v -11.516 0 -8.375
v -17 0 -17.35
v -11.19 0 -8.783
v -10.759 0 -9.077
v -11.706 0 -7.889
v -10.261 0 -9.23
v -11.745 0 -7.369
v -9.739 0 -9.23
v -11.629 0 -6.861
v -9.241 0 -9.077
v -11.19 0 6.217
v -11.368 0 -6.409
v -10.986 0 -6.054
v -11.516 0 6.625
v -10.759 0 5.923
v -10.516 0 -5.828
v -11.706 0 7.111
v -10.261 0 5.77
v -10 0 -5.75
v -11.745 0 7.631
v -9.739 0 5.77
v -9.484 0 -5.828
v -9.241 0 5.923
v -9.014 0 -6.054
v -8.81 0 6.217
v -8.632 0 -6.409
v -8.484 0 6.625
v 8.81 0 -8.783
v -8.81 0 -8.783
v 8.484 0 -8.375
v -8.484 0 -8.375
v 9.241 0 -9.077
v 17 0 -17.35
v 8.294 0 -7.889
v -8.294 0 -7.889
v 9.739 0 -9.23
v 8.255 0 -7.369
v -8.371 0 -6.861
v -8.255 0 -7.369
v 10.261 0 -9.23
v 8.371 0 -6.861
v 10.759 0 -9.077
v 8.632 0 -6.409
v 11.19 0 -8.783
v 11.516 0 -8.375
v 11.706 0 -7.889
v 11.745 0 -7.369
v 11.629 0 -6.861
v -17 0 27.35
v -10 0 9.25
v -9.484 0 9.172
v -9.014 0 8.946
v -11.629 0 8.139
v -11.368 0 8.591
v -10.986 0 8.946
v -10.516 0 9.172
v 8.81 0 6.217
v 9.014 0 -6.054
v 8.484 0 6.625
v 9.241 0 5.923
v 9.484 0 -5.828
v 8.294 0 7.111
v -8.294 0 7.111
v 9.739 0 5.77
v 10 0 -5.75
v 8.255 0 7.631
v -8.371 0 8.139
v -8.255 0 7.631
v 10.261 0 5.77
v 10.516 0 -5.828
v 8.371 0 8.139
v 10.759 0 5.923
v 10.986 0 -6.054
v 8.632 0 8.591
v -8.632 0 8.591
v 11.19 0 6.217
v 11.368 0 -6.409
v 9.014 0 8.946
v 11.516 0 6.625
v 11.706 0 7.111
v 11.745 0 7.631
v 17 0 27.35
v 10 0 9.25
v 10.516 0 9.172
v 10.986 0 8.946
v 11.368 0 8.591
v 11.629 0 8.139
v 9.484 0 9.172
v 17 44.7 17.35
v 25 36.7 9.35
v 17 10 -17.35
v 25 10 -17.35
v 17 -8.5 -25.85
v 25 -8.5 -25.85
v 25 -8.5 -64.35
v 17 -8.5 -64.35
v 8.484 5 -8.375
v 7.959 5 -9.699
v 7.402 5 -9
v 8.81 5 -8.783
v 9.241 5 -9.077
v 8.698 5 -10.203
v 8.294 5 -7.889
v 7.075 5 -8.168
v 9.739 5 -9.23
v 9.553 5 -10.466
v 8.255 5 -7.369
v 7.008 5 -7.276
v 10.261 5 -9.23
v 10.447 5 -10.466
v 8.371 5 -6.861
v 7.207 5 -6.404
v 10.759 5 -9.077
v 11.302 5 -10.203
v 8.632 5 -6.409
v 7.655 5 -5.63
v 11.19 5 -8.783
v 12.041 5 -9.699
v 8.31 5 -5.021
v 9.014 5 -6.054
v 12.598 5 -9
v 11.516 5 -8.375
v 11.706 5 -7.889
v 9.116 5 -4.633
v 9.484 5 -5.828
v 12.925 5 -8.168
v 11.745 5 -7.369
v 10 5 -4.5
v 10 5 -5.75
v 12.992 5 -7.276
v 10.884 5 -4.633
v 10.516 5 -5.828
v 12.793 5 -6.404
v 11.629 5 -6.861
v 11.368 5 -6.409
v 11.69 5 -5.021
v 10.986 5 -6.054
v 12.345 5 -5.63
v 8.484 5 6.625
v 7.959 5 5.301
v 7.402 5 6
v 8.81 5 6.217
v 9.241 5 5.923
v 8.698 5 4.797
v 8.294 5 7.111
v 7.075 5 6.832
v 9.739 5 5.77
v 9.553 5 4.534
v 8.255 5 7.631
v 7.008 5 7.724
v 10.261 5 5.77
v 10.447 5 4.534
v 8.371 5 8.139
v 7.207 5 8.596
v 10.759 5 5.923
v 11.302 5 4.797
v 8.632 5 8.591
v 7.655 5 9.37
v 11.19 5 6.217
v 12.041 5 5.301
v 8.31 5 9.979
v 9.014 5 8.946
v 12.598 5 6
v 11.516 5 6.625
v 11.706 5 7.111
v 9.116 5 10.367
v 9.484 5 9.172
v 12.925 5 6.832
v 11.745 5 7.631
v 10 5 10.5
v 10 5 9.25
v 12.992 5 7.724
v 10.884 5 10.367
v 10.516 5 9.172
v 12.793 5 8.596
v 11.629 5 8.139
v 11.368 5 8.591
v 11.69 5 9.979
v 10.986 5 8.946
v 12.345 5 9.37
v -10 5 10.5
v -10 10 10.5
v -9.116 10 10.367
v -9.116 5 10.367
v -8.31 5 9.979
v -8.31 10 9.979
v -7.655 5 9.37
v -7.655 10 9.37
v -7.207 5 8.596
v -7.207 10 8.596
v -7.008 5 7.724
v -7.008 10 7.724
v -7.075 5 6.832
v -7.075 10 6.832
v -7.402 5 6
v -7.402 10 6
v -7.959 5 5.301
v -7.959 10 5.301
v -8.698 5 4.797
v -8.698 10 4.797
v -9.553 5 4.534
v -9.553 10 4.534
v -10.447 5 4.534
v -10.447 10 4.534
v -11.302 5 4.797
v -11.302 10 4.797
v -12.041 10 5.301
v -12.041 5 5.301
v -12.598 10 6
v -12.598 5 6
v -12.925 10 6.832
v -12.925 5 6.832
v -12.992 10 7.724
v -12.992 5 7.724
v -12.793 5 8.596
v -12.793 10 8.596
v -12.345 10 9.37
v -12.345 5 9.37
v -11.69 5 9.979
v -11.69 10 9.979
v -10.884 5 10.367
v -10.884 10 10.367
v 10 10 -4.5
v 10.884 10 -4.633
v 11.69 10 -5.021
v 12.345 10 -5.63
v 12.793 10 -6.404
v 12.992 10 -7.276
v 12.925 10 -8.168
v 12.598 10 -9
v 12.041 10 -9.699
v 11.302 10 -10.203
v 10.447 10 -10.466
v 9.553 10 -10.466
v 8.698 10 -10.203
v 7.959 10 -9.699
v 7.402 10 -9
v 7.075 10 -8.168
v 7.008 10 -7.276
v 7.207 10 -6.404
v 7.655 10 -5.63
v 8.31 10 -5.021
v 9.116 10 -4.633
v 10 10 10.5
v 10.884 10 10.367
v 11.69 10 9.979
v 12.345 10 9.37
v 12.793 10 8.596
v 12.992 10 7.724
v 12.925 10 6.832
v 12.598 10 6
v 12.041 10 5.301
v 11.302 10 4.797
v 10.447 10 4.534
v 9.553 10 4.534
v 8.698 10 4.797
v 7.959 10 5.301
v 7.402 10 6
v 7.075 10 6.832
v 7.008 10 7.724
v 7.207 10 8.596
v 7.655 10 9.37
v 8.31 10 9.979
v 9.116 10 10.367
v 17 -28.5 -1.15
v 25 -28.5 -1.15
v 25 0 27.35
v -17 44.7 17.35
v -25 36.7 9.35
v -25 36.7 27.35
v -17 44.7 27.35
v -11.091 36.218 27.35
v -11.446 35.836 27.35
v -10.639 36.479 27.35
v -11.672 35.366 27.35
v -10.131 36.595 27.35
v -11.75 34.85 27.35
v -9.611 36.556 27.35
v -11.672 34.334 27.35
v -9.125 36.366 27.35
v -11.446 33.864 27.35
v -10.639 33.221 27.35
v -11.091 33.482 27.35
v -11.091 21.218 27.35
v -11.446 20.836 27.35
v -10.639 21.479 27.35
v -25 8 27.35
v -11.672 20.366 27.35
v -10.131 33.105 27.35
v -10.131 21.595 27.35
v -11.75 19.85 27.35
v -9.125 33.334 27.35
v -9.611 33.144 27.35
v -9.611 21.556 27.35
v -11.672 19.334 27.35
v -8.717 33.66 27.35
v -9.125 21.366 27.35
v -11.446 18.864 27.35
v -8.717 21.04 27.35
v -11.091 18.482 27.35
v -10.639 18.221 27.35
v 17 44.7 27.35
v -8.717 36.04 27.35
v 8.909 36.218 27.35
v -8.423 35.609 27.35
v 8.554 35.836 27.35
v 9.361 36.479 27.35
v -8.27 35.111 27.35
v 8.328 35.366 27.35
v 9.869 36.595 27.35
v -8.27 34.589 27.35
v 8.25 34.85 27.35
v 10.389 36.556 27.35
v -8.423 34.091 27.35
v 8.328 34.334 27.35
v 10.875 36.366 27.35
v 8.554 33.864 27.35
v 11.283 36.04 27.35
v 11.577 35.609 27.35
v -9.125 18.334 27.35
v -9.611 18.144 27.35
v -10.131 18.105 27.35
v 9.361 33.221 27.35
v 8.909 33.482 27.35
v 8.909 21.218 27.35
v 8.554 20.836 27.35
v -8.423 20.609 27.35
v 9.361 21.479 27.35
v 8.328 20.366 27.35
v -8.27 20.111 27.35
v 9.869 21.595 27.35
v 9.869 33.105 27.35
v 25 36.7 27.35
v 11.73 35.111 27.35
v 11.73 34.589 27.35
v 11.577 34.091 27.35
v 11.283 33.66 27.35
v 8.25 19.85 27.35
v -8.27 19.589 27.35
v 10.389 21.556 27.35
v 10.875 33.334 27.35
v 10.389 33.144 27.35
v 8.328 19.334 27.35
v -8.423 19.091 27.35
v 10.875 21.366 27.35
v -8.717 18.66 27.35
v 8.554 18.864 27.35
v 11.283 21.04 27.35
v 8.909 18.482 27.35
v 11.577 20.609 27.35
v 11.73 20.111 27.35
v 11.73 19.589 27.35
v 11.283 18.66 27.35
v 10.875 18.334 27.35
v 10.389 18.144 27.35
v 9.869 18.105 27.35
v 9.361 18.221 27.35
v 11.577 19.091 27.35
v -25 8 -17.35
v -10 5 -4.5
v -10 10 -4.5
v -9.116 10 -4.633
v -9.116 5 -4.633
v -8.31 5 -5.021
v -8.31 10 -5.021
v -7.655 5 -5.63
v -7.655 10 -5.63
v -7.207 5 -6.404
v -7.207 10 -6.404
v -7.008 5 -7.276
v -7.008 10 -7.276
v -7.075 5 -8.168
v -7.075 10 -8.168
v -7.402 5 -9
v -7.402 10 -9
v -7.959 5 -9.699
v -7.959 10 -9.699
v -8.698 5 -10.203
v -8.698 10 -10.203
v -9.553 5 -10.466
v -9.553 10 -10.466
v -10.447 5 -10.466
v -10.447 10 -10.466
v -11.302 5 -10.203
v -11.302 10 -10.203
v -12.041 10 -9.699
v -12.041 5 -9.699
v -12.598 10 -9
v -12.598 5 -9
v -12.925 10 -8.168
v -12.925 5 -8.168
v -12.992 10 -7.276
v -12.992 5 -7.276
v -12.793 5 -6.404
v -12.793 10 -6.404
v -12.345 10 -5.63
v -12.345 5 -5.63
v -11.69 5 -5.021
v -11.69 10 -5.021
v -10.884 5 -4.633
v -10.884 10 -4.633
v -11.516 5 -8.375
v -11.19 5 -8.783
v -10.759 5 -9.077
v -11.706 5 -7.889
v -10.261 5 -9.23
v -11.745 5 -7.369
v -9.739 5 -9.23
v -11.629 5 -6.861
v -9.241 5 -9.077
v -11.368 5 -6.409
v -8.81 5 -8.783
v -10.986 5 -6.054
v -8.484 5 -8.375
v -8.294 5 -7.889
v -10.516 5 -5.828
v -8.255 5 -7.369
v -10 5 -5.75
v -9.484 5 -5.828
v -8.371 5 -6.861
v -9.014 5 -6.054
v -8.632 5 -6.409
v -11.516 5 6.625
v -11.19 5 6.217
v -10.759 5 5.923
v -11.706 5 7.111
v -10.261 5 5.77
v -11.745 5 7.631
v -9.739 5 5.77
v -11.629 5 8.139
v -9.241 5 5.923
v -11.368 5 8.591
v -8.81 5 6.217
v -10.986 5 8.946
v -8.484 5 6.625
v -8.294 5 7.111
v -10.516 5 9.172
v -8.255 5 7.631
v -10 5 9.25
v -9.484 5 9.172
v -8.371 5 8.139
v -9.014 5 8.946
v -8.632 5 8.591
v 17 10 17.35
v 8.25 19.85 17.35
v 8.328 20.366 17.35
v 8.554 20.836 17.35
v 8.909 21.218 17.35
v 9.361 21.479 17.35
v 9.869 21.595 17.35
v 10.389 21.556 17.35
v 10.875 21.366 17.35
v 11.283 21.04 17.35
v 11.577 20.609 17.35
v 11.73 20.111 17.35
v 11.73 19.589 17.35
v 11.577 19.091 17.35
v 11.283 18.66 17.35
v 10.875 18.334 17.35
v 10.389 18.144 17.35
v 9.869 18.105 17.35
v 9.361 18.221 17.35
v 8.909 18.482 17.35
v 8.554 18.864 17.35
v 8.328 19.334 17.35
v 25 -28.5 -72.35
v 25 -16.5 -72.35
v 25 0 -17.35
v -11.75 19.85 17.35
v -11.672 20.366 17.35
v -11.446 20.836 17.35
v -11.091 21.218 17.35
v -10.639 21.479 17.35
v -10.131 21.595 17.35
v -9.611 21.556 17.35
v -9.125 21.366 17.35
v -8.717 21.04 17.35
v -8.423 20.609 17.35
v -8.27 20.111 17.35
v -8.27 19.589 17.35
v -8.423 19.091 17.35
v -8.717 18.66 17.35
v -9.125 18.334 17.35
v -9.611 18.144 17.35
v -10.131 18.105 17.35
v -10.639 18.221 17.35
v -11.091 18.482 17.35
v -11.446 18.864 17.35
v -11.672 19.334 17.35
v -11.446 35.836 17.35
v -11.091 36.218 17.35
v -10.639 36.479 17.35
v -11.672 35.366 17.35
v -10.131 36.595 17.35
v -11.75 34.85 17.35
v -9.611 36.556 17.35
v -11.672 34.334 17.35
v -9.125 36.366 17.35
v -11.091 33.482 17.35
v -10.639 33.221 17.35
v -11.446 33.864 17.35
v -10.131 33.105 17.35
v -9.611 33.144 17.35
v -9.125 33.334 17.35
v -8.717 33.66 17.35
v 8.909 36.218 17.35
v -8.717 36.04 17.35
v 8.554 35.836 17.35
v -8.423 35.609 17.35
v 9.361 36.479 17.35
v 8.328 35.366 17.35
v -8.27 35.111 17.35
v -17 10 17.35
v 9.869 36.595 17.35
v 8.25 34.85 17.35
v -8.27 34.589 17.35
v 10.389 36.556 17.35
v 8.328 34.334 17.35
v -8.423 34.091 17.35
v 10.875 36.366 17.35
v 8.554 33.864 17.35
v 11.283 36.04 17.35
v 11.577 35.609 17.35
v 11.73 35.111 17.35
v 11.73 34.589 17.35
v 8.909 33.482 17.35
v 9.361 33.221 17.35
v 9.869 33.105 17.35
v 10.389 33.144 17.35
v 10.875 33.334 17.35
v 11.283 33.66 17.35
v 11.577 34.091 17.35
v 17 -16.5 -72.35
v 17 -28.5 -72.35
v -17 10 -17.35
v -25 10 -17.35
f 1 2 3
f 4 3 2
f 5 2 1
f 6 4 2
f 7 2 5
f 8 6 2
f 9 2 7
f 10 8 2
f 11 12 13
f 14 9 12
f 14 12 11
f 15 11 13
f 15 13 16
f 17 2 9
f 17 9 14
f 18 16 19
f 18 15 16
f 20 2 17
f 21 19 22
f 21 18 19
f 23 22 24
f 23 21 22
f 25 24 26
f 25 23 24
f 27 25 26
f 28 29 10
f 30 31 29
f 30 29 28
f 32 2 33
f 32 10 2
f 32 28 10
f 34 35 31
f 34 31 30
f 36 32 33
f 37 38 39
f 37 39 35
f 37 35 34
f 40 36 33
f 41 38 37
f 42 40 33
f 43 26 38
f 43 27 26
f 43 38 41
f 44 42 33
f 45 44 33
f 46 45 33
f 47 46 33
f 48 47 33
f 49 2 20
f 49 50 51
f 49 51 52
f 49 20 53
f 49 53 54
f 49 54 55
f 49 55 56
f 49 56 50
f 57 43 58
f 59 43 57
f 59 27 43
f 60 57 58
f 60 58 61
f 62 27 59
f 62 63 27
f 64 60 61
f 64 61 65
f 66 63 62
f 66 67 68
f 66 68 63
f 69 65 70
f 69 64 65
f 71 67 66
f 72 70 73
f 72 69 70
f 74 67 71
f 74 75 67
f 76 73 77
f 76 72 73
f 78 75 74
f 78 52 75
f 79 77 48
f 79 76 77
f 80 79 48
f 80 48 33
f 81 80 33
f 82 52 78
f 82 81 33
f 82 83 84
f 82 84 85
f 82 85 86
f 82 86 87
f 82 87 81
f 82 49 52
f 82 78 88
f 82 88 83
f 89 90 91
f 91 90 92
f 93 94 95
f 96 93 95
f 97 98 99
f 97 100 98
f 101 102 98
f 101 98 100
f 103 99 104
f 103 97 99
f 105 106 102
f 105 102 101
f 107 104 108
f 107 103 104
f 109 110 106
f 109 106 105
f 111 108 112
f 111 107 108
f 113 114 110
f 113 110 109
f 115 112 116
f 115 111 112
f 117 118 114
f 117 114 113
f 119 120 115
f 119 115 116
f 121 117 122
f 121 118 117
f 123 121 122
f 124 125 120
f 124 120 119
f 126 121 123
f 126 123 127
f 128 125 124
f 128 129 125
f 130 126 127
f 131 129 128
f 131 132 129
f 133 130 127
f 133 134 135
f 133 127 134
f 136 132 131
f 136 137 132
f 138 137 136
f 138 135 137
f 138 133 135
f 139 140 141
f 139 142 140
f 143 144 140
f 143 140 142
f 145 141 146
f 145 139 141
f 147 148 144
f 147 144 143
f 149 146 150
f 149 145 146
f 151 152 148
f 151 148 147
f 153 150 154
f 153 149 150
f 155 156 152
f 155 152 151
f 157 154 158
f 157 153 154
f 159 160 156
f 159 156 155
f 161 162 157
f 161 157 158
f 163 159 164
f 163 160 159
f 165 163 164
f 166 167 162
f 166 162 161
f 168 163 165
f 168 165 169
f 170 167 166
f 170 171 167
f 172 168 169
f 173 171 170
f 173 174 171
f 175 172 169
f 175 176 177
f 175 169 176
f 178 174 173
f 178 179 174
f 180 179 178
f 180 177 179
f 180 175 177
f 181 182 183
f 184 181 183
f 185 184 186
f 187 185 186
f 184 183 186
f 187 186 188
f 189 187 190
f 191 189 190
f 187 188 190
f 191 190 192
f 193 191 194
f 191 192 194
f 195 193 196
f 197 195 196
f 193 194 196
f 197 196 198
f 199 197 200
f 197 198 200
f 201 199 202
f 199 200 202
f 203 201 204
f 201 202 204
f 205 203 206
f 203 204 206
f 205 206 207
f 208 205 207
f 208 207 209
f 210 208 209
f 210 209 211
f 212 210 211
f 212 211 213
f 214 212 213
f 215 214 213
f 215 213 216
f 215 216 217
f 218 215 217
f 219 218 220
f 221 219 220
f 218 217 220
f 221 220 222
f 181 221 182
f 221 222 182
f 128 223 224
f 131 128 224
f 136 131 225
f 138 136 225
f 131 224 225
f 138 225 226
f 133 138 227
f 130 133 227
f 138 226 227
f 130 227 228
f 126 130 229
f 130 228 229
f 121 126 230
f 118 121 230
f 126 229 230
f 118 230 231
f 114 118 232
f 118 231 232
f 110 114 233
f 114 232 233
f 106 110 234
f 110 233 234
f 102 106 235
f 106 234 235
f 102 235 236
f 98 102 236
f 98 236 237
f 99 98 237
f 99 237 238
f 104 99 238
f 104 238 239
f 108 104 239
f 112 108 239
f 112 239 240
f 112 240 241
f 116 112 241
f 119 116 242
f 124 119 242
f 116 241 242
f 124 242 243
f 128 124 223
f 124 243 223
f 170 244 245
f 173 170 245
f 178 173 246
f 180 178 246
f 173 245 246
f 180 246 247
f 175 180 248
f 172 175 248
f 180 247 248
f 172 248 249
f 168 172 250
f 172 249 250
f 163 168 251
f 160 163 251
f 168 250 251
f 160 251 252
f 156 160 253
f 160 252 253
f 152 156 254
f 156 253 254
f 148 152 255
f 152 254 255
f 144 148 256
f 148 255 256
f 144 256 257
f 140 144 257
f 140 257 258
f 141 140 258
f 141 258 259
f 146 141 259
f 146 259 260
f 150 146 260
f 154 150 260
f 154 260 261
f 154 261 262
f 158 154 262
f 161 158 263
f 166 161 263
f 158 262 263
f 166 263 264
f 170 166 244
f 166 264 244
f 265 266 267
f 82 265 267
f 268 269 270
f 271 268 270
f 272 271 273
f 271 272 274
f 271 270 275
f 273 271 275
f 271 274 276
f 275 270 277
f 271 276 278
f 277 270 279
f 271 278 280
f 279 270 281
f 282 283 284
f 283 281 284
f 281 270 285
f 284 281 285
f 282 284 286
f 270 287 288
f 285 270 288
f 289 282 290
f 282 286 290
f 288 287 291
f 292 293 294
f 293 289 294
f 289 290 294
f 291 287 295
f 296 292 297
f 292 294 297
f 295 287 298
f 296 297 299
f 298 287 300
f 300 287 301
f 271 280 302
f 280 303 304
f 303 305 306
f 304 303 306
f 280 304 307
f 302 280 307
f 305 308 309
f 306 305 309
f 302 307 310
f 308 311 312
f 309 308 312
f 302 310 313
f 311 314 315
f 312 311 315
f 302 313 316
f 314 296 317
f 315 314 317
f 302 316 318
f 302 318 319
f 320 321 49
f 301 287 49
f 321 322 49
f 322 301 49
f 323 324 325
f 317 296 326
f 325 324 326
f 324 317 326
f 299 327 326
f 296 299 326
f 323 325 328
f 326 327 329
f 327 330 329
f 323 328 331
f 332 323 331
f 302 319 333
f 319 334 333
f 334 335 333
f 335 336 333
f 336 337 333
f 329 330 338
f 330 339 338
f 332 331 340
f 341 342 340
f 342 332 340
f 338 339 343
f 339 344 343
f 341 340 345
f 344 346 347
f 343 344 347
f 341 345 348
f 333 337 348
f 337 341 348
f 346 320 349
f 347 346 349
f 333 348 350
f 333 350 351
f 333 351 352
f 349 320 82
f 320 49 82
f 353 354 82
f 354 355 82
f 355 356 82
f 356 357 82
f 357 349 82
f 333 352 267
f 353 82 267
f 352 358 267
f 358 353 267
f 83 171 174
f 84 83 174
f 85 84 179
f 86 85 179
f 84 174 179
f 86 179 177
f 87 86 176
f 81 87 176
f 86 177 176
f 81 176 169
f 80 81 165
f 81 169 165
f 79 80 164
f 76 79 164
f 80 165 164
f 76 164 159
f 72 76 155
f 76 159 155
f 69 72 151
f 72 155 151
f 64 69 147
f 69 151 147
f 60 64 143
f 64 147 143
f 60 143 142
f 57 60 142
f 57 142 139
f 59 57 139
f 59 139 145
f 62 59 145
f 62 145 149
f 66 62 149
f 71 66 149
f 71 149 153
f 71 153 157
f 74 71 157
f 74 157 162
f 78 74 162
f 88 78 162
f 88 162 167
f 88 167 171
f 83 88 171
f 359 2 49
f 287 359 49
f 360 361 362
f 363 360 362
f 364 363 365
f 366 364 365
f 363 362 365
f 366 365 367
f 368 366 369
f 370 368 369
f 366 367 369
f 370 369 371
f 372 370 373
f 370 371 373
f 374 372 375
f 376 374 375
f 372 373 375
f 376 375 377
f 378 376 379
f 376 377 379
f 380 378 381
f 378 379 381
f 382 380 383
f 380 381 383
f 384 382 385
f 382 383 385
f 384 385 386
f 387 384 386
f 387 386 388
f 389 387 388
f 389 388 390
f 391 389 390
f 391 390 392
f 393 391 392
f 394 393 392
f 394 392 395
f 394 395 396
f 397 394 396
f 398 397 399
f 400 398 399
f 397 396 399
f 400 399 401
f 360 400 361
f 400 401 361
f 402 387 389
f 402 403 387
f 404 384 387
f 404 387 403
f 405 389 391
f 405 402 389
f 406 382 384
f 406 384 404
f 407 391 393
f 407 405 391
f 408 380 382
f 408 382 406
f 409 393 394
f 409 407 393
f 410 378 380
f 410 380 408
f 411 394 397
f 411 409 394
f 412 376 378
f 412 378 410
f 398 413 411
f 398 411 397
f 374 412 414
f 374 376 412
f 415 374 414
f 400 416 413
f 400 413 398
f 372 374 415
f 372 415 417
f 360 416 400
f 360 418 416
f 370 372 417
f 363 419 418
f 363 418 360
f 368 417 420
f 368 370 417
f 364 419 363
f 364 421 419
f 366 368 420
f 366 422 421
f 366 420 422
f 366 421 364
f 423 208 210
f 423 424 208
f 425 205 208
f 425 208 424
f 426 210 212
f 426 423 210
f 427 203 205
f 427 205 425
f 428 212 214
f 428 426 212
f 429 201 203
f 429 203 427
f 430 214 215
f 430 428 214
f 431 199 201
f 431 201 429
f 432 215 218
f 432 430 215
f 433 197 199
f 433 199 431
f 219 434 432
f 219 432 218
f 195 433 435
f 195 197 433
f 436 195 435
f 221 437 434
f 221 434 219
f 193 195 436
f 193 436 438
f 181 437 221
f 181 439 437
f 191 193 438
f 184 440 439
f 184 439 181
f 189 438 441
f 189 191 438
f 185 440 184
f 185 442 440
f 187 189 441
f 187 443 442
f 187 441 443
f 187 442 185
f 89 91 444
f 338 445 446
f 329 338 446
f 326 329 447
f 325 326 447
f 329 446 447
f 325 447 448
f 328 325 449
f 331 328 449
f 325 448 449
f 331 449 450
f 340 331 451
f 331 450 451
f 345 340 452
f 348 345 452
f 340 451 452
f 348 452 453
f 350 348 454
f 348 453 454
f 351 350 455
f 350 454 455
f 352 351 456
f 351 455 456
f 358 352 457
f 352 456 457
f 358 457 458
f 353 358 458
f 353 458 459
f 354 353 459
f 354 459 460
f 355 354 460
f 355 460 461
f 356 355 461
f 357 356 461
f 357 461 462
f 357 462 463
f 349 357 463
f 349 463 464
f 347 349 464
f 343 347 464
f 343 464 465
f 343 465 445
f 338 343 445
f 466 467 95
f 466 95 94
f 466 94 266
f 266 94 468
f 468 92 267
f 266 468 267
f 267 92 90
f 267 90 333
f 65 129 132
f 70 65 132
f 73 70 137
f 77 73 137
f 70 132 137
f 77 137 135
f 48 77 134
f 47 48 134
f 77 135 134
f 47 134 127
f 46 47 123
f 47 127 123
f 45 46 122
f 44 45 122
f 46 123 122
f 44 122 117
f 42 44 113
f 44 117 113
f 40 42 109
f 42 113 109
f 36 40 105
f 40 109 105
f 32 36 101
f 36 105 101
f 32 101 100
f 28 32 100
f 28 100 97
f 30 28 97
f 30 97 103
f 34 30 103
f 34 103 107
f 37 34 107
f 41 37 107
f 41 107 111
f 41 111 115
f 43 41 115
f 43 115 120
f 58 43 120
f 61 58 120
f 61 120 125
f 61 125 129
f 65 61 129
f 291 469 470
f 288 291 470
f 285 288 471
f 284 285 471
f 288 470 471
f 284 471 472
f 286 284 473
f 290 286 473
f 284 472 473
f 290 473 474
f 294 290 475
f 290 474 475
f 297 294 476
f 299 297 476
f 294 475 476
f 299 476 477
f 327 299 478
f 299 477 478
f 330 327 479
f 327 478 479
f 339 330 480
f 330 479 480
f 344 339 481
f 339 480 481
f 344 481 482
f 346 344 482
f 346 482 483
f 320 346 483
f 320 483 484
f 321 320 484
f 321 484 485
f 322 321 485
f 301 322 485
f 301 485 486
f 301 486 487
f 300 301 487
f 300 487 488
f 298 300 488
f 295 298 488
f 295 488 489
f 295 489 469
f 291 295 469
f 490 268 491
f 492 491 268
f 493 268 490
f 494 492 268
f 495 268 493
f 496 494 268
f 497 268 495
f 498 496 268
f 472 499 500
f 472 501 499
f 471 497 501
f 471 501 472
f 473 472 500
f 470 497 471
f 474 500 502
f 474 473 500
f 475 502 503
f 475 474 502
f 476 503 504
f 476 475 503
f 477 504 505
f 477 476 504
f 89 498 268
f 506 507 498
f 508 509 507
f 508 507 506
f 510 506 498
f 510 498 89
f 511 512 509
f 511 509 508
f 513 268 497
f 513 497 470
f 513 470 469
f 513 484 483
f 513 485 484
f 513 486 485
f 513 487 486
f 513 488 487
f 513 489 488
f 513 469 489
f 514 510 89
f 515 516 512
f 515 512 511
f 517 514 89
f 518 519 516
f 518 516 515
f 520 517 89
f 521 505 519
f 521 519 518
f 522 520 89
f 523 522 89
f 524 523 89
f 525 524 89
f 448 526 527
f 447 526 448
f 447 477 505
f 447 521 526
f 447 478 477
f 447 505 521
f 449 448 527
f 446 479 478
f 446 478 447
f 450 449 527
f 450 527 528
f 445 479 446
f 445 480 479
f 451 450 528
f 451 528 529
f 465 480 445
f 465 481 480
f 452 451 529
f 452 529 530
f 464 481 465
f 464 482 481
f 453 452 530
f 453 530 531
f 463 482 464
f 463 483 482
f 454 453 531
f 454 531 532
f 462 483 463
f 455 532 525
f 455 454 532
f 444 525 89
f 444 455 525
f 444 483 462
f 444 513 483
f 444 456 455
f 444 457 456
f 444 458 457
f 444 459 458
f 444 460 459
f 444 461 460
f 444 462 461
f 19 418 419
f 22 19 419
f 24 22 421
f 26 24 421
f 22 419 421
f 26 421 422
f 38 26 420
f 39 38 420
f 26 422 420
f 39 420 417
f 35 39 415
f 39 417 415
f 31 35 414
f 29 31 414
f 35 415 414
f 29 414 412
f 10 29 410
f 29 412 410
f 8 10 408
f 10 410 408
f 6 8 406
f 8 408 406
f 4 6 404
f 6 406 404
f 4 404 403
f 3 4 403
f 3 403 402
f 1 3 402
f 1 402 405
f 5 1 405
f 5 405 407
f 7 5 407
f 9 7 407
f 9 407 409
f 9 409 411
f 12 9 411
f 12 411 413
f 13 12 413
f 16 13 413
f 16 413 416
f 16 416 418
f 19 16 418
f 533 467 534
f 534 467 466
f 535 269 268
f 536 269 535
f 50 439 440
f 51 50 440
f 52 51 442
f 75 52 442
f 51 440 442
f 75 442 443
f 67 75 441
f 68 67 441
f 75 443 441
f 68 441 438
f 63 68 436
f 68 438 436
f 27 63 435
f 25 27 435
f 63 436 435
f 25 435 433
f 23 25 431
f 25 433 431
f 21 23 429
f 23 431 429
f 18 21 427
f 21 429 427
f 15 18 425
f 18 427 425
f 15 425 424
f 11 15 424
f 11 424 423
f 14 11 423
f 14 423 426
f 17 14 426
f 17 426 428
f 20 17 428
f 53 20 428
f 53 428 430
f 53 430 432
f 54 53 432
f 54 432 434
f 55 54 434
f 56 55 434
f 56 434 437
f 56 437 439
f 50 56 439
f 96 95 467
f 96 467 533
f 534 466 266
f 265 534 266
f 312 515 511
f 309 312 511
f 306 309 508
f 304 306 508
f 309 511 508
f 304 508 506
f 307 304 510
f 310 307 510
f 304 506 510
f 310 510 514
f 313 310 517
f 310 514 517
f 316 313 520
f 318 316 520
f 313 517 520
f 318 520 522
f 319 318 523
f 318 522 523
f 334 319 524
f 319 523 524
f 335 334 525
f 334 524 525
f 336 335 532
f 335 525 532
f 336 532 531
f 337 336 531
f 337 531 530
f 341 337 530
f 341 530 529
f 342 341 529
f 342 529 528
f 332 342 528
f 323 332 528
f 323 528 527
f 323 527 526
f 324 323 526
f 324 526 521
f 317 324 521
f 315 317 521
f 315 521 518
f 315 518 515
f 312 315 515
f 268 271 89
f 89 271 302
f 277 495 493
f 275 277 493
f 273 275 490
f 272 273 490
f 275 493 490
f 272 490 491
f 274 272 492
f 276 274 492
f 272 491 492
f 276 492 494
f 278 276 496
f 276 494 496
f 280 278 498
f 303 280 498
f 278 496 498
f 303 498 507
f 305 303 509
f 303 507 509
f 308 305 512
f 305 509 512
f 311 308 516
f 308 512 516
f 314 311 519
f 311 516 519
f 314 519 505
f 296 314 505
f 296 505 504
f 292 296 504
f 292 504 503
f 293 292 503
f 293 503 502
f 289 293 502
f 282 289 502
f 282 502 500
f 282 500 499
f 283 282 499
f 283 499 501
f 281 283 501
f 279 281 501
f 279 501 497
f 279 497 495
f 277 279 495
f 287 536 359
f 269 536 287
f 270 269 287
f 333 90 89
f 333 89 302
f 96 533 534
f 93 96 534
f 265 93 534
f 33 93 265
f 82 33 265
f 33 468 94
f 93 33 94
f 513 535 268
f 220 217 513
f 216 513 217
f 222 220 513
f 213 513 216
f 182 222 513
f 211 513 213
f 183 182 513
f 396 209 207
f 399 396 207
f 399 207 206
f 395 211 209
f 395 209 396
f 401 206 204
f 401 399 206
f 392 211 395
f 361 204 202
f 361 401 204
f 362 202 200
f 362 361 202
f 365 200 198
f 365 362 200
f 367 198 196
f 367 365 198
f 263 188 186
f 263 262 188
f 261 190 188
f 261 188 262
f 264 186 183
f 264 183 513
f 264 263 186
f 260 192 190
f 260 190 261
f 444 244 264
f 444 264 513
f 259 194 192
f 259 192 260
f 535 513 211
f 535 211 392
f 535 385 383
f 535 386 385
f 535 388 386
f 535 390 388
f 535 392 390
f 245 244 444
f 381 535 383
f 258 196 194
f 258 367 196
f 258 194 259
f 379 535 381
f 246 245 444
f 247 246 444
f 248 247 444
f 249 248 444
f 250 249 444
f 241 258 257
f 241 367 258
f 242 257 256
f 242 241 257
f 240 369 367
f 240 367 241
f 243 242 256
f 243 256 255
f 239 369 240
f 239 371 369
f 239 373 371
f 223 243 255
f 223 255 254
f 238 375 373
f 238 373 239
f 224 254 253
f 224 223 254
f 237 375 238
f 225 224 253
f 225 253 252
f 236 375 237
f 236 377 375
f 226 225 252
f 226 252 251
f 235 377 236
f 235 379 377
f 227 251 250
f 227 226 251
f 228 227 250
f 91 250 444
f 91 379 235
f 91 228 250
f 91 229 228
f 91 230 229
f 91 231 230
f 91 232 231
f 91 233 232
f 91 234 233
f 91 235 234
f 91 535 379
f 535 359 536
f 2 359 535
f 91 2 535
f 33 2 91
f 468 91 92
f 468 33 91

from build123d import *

# Parameters (mm, degrees)
SKETCH1_W           = 50
SKETCH1_H           = 34.7
BOSS_EXTRUDE1_DEPTH = 10
CUT_EXTRUDE1_REACH  = 34.032
SKETCH2_R           = 1.75
SKETCH3_R           = 3
CUT_EXTRUDE2_DEPTH  = 5
SKETCH6_W           = 50
SKETCH6_H           = 10
BOSS_EXTRUDE3_DEPTH = 44.7
BOSS_EXTRUDE4_DEPTH = 8
BOSS_EXTRUDE5_DEPTH = 8
CHAMFER1_SIZE       = 8
CUT_EXTRUDE3_REACH  = 105.292
SKETCH10_R          = 1.75
CHAMFER2_SIZE       = 8


with BuildPart() as part:
    # Sketch1 → Boss-Extrude1 (new body)
    with BuildSketch(Plane(origin=(0, 0, 0), x_dir=(1, 0, 0), z_dir=(0, 1, 0))):
        Rectangle(SKETCH1_W, SKETCH1_H)
    extrude(amount=BOSS_EXTRUDE1_DEPTH)

    # Sketch2 → Cut-Extrude1 (cut, up to next)
    with BuildSketch(Plane(origin=(0, 10, 0), x_dir=(1, 0, 0), z_dir=(0, 1, 0)), mode=Mode.PRIVATE) as cut_extrude1_sk1:
        with Locations(Location((-10, 7.5, 0), (0, 0, 270))):
            Circle(SKETCH2_R)
    cut_extrude1_tool1 = extrude(cut_extrude1_sk1.sketch, amount=-CUT_EXTRUDE1_REACH, mode=Mode.PRIVATE) & part.part
    # Sketch2 → Cut-Extrude1 (cut, up to next)
    with BuildSketch(Plane(origin=(0, 10, 0), x_dir=(1, 0, 0), z_dir=(0, 1, 0)), mode=Mode.PRIVATE) as cut_extrude1_sk2:
        with Locations(Location((10, 7.5, 0), (0, 0, 270))):
            Circle(SKETCH2_R)
    cut_extrude1_tool2 = extrude(cut_extrude1_sk2.sketch, amount=-CUT_EXTRUDE1_REACH, mode=Mode.PRIVATE) & part.part
    # Sketch2 → Cut-Extrude1 (cut, up to next)
    with BuildSketch(Plane(origin=(0, 10, 0), x_dir=(1, 0, 0), z_dir=(0, 1, 0)), mode=Mode.PRIVATE) as cut_extrude1_sk3:
        with Locations(Location((10, -7.5, 0), (0, 0, 270))):
            Circle(SKETCH2_R)
    cut_extrude1_tool3 = extrude(cut_extrude1_sk3.sketch, amount=-CUT_EXTRUDE1_REACH, mode=Mode.PRIVATE) & part.part
    # Sketch2 → Cut-Extrude1 (cut, up to next)
    with BuildSketch(Plane(origin=(0, 10, 0), x_dir=(1, 0, 0), z_dir=(0, 1, 0)), mode=Mode.PRIVATE) as cut_extrude1_sk4:
        with Locations(Location((-10, -7.5, 0), (0, 0, 270))):
            Circle(SKETCH2_R)
    cut_extrude1_tool4 = extrude(cut_extrude1_sk4.sketch, amount=-CUT_EXTRUDE1_REACH, mode=Mode.PRIVATE) & part.part
    add(cut_extrude1_tool1.solids().sort_by_distance((-10, 10, -7.5))[0], mode=Mode.SUBTRACT)
    add(cut_extrude1_tool2.solids().sort_by_distance((10, 10, -7.5))[0], mode=Mode.SUBTRACT)
    add(cut_extrude1_tool3.solids().sort_by_distance((10, 10, 7.5))[0], mode=Mode.SUBTRACT)
    add(cut_extrude1_tool4.solids().sort_by_distance((-10, 10, 7.5))[0], mode=Mode.SUBTRACT)

    # Sketch3 → Cut-Extrude2 (cut)
    with BuildSketch(Plane(origin=(0, 10, 0), x_dir=(1, 0, 0), z_dir=(0, 1, 0))):
        with Locations(Location((-10, 7.5, 0), (0, 0, 270))):
            Circle(SKETCH3_R)
        with Locations(Location((10, 7.5, 0), (0, 0, 270))):
            Circle(SKETCH3_R)
        with Locations(Location((10, -7.5, 0), (0, 0, 270))):
            Circle(SKETCH3_R)
        with Locations(Location((-10, -7.5, 0), (0, 0, 270))):
            Circle(SKETCH3_R)
    extrude(amount=-CUT_EXTRUDE2_DEPTH, mode=Mode.SUBTRACT)

    # Sketch6 → Boss-Extrude3 (add)
    with BuildSketch(Plane.XZ):
        with Locations((0, 22.35)):
            Rectangle(SKETCH6_W, SKETCH6_H)
    extrude(amount=-BOSS_EXTRUDE3_DEPTH)

    # Sketch8 → Boss-Extrude4 (add)
    with BuildSketch(Plane(origin=(25, 0, 0), x_dir=(0, 0, -1), z_dir=(1, 0, 0))):
        Polygon((-27.35, 0), (17.35, 0), (25.85, -8.5), (72.35, -8.5), (72.35, -28.5), (1.15, -28.5), align=None)
    extrude(amount=-BOSS_EXTRUDE4_DEPTH)

    # Sketch9 → Boss-Extrude5 (add)
    with BuildSketch(Plane(origin=(25, 0, 0), x_dir=(0, 0, -1), z_dir=(1, 0, 0))):
        Polygon((-17.35, 44.7), (17.35, 10), (-17.35, 10), align=None)
    boss_extrude5 = extrude(amount=-BOSS_EXTRUDE5_DEPTH)

    # Chamfer1
    chamfer1_edges = [part.edges().sort_by_distance(p)[0] for p in [
        (21, -8.5, -72.35),
    ]]
    chamfer(chamfer1_edges, length=CHAMFER1_SIZE)

    # Mirror1: Boss-Extrude5 across plane
    add(boss_extrude5.mirror(Plane(origin=(0, 0, 0), x_dir=(0, 0, 1), z_dir=(1, 0, 0))))

    # Sketch10 → Cut-Extrude3 (cut, up to next)
    with BuildSketch(Plane(origin=(0, 0, 17.35), x_dir=(-1, 0, 0), z_dir=(0, 0, -1)), mode=Mode.PRIVATE) as cut_extrude3_sk1:
        with Locations((-10, 34.85)):
            Circle(SKETCH10_R)
    cut_extrude3_tool1 = extrude(cut_extrude3_sk1.sketch, amount=-CUT_EXTRUDE3_REACH, mode=Mode.PRIVATE) & part.part
    # Sketch10 → Cut-Extrude3 (cut, up to next)
    with BuildSketch(Plane(origin=(0, 0, 17.35), x_dir=(-1, 0, 0), z_dir=(0, 0, -1)), mode=Mode.PRIVATE) as cut_extrude3_sk2:
        with Locations((10, 34.85)):
            Circle(SKETCH10_R)
    cut_extrude3_tool2 = extrude(cut_extrude3_sk2.sketch, amount=-CUT_EXTRUDE3_REACH, mode=Mode.PRIVATE) & part.part
    # Sketch10 → Cut-Extrude3 (cut, up to next)
    with BuildSketch(Plane(origin=(0, 0, 17.35), x_dir=(-1, 0, 0), z_dir=(0, 0, -1)), mode=Mode.PRIVATE) as cut_extrude3_sk3:
        with Locations((10, 19.85)):
            Circle(SKETCH10_R)
    cut_extrude3_tool3 = extrude(cut_extrude3_sk3.sketch, amount=-CUT_EXTRUDE3_REACH, mode=Mode.PRIVATE) & part.part
    # Sketch10 → Cut-Extrude3 (cut, up to next)
    with BuildSketch(Plane(origin=(0, 0, 17.35), x_dir=(-1, 0, 0), z_dir=(0, 0, -1)), mode=Mode.PRIVATE) as cut_extrude3_sk4:
        with Locations((-10, 19.85)):
            Circle(SKETCH10_R)
    cut_extrude3_tool4 = extrude(cut_extrude3_sk4.sketch, amount=-CUT_EXTRUDE3_REACH, mode=Mode.PRIVATE) & part.part
    add(cut_extrude3_tool1.solids().sort_by_distance((10, 34.85, 17.35))[0], mode=Mode.SUBTRACT)
    add(cut_extrude3_tool2.solids().sort_by_distance((-10, 34.85, 17.35))[0], mode=Mode.SUBTRACT)
    add(cut_extrude3_tool3.solids().sort_by_distance((-10, 19.85, 17.35))[0], mode=Mode.SUBTRACT)
    add(cut_extrude3_tool4.solids().sort_by_distance((10, 19.85, 17.35))[0], mode=Mode.SUBTRACT)

    # Chamfer2
    chamfer2_edges = [part.edges().sort_by_distance(p)[0] for p in [
        (25, 44.7, 22.35),
        (-25, 44.7, 22.35),
        (-25, 0, 5),
    ]]
    chamfer(chamfer2_edges, length=CHAMFER2_SIZE)


solid = part.part
